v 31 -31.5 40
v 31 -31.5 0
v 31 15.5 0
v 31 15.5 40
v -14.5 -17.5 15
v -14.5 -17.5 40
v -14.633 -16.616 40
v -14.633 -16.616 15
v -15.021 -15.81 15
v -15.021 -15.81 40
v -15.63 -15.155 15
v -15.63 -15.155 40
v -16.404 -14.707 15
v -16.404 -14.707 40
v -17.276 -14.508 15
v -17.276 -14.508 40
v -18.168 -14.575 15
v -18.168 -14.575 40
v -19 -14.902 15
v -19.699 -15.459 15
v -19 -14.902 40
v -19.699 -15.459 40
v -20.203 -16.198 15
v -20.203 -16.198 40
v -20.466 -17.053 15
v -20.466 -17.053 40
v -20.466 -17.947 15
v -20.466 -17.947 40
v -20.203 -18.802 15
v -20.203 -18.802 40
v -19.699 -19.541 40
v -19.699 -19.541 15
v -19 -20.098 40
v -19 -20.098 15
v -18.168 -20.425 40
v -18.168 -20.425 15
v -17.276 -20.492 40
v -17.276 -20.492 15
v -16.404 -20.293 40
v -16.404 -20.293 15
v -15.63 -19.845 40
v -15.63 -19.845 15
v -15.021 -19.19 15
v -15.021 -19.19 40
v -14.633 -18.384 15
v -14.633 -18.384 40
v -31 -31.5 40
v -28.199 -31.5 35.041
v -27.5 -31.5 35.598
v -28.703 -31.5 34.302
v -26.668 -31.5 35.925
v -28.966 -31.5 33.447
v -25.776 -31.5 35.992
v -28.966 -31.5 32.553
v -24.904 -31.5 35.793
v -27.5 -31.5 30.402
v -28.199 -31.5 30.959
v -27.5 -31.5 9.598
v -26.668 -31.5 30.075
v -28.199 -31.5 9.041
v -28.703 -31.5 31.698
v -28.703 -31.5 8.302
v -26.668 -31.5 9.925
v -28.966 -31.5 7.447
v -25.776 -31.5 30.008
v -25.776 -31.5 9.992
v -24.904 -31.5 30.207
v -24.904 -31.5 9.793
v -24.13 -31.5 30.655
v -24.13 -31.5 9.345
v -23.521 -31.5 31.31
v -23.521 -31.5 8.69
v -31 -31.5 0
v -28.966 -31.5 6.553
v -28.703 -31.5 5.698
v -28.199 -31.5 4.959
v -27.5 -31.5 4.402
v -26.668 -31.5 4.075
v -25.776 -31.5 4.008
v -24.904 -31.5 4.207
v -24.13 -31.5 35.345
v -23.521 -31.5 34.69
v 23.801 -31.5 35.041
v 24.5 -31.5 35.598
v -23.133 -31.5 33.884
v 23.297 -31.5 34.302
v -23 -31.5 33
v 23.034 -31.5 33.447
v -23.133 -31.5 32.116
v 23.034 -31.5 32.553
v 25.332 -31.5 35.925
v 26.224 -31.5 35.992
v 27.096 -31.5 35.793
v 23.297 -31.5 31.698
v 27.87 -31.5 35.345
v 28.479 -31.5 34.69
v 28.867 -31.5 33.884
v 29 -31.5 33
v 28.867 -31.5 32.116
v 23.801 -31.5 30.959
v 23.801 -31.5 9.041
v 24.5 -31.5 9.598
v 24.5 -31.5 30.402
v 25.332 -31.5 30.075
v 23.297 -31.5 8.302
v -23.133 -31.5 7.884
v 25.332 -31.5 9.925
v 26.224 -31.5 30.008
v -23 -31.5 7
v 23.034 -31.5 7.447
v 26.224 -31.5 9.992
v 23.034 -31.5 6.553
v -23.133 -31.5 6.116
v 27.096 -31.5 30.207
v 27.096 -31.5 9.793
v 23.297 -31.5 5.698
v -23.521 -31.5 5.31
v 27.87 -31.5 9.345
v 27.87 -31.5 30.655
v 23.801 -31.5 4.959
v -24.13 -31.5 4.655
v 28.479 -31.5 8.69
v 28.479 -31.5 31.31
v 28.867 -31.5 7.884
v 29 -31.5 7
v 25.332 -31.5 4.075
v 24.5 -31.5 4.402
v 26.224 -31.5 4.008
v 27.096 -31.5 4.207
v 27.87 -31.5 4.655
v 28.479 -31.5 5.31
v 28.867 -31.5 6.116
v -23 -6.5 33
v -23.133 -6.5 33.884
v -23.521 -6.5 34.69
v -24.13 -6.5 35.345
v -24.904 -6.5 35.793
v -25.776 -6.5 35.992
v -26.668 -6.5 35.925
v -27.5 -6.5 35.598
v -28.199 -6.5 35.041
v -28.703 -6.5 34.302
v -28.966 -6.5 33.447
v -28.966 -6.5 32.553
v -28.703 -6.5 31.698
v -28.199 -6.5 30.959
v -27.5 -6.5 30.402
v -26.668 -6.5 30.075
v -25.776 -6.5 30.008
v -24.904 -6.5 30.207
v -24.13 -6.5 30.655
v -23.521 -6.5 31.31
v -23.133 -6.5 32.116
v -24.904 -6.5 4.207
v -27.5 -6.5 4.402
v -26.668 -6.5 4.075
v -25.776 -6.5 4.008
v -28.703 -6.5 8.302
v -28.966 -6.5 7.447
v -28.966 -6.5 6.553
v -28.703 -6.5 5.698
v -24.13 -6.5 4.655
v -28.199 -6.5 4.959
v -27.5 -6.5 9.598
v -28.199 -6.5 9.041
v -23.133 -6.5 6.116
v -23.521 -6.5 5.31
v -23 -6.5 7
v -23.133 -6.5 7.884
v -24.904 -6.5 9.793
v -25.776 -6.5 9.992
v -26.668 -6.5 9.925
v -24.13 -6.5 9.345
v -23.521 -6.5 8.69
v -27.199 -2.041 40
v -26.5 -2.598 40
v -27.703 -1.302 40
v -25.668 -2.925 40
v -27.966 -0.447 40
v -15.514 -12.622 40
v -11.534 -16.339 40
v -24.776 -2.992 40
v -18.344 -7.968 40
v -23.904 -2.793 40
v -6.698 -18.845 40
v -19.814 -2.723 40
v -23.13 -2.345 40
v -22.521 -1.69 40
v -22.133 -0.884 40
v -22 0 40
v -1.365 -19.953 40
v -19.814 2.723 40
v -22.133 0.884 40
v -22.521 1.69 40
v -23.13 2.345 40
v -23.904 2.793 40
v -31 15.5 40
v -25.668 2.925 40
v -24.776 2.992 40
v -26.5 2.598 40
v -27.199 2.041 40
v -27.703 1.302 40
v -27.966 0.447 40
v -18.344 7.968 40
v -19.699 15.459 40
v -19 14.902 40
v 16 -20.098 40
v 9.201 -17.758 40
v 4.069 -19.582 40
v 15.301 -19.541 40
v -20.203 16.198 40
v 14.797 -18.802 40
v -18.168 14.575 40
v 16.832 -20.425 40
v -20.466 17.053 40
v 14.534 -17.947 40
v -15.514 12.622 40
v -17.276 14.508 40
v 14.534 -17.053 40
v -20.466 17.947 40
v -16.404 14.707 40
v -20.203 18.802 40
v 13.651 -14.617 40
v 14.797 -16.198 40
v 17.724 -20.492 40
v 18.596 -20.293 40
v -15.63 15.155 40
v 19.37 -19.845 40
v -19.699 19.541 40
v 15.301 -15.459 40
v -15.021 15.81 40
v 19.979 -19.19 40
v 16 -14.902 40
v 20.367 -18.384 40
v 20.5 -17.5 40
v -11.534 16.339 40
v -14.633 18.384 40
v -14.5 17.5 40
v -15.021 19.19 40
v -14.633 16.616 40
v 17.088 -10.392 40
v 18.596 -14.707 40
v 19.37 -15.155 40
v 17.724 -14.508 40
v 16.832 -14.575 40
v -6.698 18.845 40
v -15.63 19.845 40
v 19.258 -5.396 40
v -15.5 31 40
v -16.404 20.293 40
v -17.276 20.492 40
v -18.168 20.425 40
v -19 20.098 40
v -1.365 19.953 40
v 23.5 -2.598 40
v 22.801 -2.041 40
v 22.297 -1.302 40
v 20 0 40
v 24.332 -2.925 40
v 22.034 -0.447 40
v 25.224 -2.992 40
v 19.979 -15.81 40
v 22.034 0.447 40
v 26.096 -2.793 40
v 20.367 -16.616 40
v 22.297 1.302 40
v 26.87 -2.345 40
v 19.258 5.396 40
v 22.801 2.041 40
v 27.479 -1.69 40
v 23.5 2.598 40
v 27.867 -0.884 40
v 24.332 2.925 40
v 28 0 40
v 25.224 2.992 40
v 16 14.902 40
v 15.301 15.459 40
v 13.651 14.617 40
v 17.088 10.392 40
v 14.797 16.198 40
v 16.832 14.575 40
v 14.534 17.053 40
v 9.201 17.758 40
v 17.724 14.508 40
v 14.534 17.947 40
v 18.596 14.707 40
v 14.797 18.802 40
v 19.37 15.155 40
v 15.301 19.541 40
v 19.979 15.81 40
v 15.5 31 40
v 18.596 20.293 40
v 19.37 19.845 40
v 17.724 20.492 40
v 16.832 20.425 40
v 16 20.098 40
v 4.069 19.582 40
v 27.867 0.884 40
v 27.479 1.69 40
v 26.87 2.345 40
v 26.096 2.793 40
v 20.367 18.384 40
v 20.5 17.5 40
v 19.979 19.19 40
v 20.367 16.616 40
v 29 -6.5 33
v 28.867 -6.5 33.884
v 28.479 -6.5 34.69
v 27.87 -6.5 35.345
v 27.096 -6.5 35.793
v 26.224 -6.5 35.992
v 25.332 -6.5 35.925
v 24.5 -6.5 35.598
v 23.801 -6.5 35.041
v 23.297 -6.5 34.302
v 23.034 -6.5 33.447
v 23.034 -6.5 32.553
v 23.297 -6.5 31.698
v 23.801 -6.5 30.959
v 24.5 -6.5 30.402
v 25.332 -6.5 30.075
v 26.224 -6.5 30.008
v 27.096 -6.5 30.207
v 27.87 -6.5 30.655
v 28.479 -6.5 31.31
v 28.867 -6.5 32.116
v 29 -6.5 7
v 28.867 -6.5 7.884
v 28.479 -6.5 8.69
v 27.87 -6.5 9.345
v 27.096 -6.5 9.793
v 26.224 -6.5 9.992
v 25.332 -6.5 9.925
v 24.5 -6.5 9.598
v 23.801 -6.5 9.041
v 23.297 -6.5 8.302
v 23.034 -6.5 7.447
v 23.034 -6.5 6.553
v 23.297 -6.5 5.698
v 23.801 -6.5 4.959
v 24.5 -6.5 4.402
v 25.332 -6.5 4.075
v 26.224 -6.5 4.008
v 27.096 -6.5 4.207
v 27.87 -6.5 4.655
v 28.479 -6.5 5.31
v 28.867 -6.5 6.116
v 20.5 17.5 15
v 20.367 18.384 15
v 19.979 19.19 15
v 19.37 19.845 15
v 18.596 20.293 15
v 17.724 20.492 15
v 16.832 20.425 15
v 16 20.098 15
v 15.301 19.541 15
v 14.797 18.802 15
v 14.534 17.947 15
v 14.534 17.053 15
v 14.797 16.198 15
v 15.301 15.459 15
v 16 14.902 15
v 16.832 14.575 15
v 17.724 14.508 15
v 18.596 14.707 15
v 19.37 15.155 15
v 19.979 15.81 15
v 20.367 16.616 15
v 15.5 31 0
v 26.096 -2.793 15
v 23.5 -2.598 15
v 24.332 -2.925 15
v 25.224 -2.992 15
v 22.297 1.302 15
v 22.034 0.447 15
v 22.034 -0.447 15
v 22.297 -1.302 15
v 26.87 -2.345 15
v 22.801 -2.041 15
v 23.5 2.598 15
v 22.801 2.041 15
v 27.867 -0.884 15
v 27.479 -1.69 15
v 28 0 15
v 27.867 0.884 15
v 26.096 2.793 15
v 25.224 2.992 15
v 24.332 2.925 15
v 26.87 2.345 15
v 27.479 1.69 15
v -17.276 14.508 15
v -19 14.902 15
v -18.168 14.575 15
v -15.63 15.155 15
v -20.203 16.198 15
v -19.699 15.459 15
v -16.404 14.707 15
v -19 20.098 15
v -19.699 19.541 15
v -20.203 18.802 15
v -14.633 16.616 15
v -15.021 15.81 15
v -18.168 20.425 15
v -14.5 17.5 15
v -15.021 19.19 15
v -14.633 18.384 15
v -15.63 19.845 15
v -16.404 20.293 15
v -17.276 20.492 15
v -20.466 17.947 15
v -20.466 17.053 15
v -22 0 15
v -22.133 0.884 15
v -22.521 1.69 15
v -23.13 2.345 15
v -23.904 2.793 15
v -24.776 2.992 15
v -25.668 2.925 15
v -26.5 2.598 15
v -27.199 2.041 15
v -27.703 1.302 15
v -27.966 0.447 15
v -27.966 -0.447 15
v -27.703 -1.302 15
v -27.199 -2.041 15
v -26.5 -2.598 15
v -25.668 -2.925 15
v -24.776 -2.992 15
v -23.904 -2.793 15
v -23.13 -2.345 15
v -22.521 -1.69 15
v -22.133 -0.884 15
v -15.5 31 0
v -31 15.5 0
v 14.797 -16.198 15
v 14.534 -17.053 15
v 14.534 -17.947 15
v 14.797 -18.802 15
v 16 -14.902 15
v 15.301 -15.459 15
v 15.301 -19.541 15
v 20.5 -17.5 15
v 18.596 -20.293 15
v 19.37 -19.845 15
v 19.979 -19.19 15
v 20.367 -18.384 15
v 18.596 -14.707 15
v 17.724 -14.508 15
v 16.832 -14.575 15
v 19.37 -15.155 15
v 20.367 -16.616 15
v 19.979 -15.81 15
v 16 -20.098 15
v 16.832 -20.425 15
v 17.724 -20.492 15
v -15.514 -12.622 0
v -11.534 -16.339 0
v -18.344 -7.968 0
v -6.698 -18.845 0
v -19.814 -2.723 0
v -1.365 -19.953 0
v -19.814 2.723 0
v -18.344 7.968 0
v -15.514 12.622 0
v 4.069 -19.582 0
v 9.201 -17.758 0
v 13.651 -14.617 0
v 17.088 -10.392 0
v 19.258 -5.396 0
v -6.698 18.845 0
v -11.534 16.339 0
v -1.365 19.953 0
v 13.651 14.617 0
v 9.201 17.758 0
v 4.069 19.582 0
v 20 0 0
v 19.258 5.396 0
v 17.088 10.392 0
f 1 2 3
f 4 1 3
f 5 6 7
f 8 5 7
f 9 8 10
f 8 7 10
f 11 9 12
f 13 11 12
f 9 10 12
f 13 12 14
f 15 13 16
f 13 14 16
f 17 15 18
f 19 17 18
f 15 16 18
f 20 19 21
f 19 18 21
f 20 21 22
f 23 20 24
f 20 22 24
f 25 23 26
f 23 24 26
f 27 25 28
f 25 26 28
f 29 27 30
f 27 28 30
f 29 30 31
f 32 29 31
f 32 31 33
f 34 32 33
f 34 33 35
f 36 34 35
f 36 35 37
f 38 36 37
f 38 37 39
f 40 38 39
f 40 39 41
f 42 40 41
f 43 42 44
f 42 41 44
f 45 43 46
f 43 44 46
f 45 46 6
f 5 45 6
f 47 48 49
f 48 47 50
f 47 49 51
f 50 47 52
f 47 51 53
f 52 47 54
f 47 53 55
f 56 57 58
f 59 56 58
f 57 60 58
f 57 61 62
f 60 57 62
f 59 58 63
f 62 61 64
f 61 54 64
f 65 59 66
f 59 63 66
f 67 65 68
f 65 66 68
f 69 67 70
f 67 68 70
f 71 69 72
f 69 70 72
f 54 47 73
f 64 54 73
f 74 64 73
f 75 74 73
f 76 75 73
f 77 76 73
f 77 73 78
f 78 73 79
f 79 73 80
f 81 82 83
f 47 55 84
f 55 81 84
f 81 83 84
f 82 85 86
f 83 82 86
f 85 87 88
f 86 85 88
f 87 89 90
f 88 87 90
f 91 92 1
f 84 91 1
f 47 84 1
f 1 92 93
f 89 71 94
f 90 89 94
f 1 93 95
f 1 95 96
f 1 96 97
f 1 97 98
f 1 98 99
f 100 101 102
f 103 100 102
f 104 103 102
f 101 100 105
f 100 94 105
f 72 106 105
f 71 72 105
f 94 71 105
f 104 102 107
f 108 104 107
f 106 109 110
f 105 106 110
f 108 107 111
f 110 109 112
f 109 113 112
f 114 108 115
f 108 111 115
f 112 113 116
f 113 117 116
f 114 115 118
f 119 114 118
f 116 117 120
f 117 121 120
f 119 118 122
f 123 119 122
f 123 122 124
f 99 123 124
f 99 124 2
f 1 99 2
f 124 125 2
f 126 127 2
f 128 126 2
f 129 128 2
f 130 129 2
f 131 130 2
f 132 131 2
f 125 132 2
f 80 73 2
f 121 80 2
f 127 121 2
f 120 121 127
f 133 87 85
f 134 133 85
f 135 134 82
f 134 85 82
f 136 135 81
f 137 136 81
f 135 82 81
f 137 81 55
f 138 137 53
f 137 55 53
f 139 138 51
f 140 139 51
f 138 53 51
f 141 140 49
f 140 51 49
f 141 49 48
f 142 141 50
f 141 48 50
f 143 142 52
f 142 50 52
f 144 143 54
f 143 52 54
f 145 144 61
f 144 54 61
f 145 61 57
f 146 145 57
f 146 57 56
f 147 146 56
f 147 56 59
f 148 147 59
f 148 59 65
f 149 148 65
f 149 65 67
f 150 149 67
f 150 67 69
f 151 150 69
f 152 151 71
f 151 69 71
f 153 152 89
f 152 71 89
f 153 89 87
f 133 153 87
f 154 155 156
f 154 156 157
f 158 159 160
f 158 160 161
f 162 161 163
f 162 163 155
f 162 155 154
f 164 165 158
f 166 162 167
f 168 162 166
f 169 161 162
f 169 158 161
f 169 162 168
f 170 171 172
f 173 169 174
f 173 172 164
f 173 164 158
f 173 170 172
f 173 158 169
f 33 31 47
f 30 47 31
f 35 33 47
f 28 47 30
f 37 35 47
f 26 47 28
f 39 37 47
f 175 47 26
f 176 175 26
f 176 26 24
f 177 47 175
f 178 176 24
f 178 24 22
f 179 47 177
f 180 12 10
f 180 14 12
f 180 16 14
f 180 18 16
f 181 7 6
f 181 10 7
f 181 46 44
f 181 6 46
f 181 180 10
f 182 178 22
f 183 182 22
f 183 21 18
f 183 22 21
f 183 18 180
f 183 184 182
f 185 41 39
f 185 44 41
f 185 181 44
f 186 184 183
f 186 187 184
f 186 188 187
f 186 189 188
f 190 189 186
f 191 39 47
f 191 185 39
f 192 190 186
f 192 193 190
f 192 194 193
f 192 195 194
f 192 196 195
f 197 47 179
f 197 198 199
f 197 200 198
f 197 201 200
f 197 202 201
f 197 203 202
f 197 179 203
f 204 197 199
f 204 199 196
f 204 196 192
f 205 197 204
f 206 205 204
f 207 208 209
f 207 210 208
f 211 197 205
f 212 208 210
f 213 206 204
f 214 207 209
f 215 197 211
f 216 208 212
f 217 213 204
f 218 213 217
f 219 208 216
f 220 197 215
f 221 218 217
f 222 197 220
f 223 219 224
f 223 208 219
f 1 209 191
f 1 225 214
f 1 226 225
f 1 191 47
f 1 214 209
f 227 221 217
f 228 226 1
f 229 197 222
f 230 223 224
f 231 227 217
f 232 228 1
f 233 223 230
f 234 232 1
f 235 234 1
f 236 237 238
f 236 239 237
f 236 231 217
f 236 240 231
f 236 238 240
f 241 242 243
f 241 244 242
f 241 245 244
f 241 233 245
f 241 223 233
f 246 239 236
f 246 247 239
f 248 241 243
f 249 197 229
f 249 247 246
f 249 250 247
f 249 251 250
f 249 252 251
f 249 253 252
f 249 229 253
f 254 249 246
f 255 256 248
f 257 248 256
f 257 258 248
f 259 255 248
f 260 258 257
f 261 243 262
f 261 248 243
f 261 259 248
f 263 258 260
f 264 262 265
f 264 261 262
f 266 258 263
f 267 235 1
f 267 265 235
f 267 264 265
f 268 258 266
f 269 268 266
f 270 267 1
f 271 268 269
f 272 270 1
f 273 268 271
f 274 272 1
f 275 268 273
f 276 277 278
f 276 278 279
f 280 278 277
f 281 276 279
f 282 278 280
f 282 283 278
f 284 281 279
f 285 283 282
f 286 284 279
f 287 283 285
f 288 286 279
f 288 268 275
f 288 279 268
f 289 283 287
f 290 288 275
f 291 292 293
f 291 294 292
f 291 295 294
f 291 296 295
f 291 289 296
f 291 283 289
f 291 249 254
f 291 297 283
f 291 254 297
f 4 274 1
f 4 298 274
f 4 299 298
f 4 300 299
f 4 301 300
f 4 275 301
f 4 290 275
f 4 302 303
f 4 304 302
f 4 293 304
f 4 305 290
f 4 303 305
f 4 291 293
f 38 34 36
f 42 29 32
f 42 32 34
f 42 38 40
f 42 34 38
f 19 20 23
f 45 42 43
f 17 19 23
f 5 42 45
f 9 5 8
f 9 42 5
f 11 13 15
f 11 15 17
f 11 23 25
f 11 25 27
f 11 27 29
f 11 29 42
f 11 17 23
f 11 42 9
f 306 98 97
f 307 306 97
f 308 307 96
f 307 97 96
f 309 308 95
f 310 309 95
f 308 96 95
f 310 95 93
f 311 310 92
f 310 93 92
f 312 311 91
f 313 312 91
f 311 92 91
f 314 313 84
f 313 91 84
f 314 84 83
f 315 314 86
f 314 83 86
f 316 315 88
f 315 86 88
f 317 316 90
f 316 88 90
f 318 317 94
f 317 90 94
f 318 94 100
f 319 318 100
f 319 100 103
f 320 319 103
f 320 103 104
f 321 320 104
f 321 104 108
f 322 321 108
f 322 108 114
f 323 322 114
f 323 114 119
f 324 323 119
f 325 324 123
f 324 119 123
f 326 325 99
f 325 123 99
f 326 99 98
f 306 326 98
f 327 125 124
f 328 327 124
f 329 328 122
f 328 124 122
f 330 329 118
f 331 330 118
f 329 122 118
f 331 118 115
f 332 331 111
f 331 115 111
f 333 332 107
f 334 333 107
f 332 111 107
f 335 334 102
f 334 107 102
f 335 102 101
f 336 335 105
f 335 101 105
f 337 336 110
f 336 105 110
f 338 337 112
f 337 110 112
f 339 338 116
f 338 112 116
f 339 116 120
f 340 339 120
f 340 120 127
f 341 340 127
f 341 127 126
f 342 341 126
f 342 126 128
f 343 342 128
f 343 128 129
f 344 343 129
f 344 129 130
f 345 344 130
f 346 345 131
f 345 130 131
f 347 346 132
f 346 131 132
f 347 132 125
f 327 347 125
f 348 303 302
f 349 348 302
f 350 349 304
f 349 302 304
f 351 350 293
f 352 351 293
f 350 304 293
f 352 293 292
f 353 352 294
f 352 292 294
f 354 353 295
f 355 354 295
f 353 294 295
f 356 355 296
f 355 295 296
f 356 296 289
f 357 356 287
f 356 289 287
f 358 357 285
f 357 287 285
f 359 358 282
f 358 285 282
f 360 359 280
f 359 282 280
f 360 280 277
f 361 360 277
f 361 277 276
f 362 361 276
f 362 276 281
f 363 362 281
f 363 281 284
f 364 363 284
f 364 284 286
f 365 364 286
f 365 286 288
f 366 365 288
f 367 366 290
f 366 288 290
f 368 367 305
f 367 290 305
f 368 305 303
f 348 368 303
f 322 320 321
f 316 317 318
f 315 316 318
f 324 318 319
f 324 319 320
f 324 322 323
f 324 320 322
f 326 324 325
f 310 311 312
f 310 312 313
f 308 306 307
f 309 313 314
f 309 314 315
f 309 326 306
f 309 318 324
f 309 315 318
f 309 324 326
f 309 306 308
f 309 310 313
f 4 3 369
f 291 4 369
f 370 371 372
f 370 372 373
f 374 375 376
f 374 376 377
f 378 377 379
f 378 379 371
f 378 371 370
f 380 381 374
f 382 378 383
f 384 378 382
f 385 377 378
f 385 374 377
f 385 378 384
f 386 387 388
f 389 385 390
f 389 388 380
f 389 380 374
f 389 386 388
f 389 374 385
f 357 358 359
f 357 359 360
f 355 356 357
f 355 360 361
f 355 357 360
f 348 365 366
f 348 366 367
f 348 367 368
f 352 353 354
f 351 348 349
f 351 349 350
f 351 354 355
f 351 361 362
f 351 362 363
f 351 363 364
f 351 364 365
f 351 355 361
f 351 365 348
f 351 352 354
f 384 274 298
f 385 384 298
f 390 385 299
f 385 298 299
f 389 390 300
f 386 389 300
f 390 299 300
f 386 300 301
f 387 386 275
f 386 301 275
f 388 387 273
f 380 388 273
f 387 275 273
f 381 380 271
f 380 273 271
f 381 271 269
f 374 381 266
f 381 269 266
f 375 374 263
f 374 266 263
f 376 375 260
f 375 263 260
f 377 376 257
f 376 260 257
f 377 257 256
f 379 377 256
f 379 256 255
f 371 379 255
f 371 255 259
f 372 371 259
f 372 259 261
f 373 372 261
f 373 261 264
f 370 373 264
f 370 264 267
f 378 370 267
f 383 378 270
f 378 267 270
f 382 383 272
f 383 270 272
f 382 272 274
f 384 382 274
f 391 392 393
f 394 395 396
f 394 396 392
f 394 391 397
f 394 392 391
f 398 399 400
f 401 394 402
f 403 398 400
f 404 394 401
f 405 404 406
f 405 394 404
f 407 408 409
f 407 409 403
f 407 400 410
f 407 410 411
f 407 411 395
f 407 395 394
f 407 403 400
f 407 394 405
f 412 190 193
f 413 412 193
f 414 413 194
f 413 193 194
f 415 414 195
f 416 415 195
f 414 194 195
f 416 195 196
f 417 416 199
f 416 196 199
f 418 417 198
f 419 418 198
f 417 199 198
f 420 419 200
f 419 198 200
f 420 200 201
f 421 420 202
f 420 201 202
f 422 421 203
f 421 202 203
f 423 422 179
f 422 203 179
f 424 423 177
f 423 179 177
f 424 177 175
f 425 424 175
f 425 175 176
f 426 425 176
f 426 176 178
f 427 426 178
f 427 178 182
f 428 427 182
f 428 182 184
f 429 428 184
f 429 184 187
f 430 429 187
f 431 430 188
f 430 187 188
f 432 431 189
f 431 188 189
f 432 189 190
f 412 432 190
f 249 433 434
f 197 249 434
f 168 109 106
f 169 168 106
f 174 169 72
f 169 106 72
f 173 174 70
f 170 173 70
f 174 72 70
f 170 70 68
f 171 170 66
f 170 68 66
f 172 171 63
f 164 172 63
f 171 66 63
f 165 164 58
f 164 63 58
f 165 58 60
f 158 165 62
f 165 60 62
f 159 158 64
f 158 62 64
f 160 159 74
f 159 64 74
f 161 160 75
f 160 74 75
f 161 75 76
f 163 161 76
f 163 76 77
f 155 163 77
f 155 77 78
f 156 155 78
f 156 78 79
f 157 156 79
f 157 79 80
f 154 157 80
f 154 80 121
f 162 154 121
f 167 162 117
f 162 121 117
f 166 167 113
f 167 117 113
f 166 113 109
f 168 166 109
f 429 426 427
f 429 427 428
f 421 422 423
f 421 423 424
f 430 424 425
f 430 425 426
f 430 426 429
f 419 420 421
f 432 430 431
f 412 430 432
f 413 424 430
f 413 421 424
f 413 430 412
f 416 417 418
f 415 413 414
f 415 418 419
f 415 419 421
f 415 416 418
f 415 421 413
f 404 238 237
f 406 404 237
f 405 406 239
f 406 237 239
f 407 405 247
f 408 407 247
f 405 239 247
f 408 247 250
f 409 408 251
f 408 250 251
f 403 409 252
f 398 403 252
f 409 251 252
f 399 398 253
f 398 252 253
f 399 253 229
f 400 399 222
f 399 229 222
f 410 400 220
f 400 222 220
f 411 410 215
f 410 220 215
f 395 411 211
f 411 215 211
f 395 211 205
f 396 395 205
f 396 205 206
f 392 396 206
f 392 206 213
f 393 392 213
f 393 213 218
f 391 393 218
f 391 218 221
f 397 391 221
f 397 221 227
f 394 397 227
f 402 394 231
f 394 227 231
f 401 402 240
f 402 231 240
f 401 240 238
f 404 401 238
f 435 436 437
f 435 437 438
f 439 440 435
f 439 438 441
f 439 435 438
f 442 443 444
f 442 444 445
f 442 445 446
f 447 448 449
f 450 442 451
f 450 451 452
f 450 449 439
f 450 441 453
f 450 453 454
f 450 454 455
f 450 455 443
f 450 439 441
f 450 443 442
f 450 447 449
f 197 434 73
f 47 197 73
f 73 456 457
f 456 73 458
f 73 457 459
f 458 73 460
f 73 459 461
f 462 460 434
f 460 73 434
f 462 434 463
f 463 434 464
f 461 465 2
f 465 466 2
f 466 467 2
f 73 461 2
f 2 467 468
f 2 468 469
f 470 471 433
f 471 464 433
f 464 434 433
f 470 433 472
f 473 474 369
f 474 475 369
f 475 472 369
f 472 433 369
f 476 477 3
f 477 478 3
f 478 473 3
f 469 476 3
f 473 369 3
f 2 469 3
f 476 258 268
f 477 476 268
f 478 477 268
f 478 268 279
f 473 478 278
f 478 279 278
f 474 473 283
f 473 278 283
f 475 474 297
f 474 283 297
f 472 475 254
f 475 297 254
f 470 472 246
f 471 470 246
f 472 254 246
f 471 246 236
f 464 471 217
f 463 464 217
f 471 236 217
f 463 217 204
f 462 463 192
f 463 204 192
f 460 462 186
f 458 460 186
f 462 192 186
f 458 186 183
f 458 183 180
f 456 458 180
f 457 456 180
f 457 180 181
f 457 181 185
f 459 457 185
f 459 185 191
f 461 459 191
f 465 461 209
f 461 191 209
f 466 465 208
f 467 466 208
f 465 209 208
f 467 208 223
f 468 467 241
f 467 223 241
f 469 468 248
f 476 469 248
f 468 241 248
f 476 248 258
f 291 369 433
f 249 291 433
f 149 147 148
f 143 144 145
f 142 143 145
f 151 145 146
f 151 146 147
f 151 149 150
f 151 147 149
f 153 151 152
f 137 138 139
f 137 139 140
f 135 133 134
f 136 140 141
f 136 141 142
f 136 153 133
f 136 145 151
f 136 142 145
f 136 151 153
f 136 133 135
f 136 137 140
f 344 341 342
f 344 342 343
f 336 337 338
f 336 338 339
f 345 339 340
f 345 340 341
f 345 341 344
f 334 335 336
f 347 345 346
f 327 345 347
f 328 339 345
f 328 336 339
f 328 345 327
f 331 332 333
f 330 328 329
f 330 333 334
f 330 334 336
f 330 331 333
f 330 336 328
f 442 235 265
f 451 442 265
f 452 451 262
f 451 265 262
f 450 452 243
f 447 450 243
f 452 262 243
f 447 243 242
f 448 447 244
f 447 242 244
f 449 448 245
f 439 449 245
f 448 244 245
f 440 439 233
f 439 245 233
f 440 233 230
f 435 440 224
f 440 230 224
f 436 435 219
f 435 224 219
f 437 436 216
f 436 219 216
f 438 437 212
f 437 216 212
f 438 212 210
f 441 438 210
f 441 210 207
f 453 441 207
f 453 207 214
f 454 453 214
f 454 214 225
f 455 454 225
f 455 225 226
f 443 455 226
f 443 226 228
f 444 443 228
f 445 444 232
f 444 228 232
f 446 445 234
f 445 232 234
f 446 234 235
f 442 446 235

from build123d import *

# Parameters (mm, degrees)
DODANIE_WYCI_GNI_CIE1_DEPTH = 40
SZKIC2_R                    = 20
WYTNIJ_WYCI_GNI_CIE1_DEPTH  = 40
SZKIC4_R                    = 3
WYTNIJ_WYCI_GNI_CIE2_DEPTH  = 25
SZKIC5_R                    = 3
WYTNIJ_WYCI_GNI_CIE4_DEPTH  = 25


with BuildPart() as part:
    # Szkic1 → Dodanie-wyciągnięcie1 (new body)
    with BuildSketch(Plane.XY):
        Polygon((31, -31.5), (31, 15.5), (15.5, 31), (-15.5, 31), (-31, 15.5), (-31, -31.5), align=None)
    extrude(amount=DODANIE_WYCI_GNI_CIE1_DEPTH)

    # Szkic2 → Wytnij-wyciągnięcie1 (cut)
    with BuildSketch(Plane.XY.offset(40)):
        Circle(SZKIC2_R)
    extrude(amount=-WYTNIJ_WYCI_GNI_CIE1_DEPTH, mode=Mode.SUBTRACT)

    # Szkic4 → Wytnij-wyciągnięcie2 (cut)
    with BuildSketch(Plane.XY.offset(40)):
        with Locations((17.5, -17.5)):
            Circle(SZKIC4_R)
        with Locations((25, 0)):
            Circle(SZKIC4_R)
        with Locations((17.5, 17.5)):
            Circle(SZKIC4_R)
        with Locations((-25, 0)):
            Circle(SZKIC4_R)
        with Locations((-17.5, 17.5)):
            Circle(SZKIC4_R)
        with Locations((-17.5, -17.5)):
            Circle(SZKIC4_R)
    extrude(amount=-WYTNIJ_WYCI_GNI_CIE2_DEPTH, mode=Mode.SUBTRACT)

    # Szkic5 → Wytnij-wyciągnięcie4 (cut)
    with BuildSketch(Plane.XZ.offset(31.5)):
        with Locations((-26, 33)):
            Circle(SZKIC5_R)
        with Locations((-26, 7)):
            Circle(SZKIC5_R)
        with Locations((26, 33)):
            Circle(SZKIC5_R)
        with Locations((26, 7)):
            Circle(SZKIC5_R)
    extrude(amount=-WYTNIJ_WYCI_GNI_CIE4_DEPTH, mode=Mode.SUBTRACT)


solid = part.part
